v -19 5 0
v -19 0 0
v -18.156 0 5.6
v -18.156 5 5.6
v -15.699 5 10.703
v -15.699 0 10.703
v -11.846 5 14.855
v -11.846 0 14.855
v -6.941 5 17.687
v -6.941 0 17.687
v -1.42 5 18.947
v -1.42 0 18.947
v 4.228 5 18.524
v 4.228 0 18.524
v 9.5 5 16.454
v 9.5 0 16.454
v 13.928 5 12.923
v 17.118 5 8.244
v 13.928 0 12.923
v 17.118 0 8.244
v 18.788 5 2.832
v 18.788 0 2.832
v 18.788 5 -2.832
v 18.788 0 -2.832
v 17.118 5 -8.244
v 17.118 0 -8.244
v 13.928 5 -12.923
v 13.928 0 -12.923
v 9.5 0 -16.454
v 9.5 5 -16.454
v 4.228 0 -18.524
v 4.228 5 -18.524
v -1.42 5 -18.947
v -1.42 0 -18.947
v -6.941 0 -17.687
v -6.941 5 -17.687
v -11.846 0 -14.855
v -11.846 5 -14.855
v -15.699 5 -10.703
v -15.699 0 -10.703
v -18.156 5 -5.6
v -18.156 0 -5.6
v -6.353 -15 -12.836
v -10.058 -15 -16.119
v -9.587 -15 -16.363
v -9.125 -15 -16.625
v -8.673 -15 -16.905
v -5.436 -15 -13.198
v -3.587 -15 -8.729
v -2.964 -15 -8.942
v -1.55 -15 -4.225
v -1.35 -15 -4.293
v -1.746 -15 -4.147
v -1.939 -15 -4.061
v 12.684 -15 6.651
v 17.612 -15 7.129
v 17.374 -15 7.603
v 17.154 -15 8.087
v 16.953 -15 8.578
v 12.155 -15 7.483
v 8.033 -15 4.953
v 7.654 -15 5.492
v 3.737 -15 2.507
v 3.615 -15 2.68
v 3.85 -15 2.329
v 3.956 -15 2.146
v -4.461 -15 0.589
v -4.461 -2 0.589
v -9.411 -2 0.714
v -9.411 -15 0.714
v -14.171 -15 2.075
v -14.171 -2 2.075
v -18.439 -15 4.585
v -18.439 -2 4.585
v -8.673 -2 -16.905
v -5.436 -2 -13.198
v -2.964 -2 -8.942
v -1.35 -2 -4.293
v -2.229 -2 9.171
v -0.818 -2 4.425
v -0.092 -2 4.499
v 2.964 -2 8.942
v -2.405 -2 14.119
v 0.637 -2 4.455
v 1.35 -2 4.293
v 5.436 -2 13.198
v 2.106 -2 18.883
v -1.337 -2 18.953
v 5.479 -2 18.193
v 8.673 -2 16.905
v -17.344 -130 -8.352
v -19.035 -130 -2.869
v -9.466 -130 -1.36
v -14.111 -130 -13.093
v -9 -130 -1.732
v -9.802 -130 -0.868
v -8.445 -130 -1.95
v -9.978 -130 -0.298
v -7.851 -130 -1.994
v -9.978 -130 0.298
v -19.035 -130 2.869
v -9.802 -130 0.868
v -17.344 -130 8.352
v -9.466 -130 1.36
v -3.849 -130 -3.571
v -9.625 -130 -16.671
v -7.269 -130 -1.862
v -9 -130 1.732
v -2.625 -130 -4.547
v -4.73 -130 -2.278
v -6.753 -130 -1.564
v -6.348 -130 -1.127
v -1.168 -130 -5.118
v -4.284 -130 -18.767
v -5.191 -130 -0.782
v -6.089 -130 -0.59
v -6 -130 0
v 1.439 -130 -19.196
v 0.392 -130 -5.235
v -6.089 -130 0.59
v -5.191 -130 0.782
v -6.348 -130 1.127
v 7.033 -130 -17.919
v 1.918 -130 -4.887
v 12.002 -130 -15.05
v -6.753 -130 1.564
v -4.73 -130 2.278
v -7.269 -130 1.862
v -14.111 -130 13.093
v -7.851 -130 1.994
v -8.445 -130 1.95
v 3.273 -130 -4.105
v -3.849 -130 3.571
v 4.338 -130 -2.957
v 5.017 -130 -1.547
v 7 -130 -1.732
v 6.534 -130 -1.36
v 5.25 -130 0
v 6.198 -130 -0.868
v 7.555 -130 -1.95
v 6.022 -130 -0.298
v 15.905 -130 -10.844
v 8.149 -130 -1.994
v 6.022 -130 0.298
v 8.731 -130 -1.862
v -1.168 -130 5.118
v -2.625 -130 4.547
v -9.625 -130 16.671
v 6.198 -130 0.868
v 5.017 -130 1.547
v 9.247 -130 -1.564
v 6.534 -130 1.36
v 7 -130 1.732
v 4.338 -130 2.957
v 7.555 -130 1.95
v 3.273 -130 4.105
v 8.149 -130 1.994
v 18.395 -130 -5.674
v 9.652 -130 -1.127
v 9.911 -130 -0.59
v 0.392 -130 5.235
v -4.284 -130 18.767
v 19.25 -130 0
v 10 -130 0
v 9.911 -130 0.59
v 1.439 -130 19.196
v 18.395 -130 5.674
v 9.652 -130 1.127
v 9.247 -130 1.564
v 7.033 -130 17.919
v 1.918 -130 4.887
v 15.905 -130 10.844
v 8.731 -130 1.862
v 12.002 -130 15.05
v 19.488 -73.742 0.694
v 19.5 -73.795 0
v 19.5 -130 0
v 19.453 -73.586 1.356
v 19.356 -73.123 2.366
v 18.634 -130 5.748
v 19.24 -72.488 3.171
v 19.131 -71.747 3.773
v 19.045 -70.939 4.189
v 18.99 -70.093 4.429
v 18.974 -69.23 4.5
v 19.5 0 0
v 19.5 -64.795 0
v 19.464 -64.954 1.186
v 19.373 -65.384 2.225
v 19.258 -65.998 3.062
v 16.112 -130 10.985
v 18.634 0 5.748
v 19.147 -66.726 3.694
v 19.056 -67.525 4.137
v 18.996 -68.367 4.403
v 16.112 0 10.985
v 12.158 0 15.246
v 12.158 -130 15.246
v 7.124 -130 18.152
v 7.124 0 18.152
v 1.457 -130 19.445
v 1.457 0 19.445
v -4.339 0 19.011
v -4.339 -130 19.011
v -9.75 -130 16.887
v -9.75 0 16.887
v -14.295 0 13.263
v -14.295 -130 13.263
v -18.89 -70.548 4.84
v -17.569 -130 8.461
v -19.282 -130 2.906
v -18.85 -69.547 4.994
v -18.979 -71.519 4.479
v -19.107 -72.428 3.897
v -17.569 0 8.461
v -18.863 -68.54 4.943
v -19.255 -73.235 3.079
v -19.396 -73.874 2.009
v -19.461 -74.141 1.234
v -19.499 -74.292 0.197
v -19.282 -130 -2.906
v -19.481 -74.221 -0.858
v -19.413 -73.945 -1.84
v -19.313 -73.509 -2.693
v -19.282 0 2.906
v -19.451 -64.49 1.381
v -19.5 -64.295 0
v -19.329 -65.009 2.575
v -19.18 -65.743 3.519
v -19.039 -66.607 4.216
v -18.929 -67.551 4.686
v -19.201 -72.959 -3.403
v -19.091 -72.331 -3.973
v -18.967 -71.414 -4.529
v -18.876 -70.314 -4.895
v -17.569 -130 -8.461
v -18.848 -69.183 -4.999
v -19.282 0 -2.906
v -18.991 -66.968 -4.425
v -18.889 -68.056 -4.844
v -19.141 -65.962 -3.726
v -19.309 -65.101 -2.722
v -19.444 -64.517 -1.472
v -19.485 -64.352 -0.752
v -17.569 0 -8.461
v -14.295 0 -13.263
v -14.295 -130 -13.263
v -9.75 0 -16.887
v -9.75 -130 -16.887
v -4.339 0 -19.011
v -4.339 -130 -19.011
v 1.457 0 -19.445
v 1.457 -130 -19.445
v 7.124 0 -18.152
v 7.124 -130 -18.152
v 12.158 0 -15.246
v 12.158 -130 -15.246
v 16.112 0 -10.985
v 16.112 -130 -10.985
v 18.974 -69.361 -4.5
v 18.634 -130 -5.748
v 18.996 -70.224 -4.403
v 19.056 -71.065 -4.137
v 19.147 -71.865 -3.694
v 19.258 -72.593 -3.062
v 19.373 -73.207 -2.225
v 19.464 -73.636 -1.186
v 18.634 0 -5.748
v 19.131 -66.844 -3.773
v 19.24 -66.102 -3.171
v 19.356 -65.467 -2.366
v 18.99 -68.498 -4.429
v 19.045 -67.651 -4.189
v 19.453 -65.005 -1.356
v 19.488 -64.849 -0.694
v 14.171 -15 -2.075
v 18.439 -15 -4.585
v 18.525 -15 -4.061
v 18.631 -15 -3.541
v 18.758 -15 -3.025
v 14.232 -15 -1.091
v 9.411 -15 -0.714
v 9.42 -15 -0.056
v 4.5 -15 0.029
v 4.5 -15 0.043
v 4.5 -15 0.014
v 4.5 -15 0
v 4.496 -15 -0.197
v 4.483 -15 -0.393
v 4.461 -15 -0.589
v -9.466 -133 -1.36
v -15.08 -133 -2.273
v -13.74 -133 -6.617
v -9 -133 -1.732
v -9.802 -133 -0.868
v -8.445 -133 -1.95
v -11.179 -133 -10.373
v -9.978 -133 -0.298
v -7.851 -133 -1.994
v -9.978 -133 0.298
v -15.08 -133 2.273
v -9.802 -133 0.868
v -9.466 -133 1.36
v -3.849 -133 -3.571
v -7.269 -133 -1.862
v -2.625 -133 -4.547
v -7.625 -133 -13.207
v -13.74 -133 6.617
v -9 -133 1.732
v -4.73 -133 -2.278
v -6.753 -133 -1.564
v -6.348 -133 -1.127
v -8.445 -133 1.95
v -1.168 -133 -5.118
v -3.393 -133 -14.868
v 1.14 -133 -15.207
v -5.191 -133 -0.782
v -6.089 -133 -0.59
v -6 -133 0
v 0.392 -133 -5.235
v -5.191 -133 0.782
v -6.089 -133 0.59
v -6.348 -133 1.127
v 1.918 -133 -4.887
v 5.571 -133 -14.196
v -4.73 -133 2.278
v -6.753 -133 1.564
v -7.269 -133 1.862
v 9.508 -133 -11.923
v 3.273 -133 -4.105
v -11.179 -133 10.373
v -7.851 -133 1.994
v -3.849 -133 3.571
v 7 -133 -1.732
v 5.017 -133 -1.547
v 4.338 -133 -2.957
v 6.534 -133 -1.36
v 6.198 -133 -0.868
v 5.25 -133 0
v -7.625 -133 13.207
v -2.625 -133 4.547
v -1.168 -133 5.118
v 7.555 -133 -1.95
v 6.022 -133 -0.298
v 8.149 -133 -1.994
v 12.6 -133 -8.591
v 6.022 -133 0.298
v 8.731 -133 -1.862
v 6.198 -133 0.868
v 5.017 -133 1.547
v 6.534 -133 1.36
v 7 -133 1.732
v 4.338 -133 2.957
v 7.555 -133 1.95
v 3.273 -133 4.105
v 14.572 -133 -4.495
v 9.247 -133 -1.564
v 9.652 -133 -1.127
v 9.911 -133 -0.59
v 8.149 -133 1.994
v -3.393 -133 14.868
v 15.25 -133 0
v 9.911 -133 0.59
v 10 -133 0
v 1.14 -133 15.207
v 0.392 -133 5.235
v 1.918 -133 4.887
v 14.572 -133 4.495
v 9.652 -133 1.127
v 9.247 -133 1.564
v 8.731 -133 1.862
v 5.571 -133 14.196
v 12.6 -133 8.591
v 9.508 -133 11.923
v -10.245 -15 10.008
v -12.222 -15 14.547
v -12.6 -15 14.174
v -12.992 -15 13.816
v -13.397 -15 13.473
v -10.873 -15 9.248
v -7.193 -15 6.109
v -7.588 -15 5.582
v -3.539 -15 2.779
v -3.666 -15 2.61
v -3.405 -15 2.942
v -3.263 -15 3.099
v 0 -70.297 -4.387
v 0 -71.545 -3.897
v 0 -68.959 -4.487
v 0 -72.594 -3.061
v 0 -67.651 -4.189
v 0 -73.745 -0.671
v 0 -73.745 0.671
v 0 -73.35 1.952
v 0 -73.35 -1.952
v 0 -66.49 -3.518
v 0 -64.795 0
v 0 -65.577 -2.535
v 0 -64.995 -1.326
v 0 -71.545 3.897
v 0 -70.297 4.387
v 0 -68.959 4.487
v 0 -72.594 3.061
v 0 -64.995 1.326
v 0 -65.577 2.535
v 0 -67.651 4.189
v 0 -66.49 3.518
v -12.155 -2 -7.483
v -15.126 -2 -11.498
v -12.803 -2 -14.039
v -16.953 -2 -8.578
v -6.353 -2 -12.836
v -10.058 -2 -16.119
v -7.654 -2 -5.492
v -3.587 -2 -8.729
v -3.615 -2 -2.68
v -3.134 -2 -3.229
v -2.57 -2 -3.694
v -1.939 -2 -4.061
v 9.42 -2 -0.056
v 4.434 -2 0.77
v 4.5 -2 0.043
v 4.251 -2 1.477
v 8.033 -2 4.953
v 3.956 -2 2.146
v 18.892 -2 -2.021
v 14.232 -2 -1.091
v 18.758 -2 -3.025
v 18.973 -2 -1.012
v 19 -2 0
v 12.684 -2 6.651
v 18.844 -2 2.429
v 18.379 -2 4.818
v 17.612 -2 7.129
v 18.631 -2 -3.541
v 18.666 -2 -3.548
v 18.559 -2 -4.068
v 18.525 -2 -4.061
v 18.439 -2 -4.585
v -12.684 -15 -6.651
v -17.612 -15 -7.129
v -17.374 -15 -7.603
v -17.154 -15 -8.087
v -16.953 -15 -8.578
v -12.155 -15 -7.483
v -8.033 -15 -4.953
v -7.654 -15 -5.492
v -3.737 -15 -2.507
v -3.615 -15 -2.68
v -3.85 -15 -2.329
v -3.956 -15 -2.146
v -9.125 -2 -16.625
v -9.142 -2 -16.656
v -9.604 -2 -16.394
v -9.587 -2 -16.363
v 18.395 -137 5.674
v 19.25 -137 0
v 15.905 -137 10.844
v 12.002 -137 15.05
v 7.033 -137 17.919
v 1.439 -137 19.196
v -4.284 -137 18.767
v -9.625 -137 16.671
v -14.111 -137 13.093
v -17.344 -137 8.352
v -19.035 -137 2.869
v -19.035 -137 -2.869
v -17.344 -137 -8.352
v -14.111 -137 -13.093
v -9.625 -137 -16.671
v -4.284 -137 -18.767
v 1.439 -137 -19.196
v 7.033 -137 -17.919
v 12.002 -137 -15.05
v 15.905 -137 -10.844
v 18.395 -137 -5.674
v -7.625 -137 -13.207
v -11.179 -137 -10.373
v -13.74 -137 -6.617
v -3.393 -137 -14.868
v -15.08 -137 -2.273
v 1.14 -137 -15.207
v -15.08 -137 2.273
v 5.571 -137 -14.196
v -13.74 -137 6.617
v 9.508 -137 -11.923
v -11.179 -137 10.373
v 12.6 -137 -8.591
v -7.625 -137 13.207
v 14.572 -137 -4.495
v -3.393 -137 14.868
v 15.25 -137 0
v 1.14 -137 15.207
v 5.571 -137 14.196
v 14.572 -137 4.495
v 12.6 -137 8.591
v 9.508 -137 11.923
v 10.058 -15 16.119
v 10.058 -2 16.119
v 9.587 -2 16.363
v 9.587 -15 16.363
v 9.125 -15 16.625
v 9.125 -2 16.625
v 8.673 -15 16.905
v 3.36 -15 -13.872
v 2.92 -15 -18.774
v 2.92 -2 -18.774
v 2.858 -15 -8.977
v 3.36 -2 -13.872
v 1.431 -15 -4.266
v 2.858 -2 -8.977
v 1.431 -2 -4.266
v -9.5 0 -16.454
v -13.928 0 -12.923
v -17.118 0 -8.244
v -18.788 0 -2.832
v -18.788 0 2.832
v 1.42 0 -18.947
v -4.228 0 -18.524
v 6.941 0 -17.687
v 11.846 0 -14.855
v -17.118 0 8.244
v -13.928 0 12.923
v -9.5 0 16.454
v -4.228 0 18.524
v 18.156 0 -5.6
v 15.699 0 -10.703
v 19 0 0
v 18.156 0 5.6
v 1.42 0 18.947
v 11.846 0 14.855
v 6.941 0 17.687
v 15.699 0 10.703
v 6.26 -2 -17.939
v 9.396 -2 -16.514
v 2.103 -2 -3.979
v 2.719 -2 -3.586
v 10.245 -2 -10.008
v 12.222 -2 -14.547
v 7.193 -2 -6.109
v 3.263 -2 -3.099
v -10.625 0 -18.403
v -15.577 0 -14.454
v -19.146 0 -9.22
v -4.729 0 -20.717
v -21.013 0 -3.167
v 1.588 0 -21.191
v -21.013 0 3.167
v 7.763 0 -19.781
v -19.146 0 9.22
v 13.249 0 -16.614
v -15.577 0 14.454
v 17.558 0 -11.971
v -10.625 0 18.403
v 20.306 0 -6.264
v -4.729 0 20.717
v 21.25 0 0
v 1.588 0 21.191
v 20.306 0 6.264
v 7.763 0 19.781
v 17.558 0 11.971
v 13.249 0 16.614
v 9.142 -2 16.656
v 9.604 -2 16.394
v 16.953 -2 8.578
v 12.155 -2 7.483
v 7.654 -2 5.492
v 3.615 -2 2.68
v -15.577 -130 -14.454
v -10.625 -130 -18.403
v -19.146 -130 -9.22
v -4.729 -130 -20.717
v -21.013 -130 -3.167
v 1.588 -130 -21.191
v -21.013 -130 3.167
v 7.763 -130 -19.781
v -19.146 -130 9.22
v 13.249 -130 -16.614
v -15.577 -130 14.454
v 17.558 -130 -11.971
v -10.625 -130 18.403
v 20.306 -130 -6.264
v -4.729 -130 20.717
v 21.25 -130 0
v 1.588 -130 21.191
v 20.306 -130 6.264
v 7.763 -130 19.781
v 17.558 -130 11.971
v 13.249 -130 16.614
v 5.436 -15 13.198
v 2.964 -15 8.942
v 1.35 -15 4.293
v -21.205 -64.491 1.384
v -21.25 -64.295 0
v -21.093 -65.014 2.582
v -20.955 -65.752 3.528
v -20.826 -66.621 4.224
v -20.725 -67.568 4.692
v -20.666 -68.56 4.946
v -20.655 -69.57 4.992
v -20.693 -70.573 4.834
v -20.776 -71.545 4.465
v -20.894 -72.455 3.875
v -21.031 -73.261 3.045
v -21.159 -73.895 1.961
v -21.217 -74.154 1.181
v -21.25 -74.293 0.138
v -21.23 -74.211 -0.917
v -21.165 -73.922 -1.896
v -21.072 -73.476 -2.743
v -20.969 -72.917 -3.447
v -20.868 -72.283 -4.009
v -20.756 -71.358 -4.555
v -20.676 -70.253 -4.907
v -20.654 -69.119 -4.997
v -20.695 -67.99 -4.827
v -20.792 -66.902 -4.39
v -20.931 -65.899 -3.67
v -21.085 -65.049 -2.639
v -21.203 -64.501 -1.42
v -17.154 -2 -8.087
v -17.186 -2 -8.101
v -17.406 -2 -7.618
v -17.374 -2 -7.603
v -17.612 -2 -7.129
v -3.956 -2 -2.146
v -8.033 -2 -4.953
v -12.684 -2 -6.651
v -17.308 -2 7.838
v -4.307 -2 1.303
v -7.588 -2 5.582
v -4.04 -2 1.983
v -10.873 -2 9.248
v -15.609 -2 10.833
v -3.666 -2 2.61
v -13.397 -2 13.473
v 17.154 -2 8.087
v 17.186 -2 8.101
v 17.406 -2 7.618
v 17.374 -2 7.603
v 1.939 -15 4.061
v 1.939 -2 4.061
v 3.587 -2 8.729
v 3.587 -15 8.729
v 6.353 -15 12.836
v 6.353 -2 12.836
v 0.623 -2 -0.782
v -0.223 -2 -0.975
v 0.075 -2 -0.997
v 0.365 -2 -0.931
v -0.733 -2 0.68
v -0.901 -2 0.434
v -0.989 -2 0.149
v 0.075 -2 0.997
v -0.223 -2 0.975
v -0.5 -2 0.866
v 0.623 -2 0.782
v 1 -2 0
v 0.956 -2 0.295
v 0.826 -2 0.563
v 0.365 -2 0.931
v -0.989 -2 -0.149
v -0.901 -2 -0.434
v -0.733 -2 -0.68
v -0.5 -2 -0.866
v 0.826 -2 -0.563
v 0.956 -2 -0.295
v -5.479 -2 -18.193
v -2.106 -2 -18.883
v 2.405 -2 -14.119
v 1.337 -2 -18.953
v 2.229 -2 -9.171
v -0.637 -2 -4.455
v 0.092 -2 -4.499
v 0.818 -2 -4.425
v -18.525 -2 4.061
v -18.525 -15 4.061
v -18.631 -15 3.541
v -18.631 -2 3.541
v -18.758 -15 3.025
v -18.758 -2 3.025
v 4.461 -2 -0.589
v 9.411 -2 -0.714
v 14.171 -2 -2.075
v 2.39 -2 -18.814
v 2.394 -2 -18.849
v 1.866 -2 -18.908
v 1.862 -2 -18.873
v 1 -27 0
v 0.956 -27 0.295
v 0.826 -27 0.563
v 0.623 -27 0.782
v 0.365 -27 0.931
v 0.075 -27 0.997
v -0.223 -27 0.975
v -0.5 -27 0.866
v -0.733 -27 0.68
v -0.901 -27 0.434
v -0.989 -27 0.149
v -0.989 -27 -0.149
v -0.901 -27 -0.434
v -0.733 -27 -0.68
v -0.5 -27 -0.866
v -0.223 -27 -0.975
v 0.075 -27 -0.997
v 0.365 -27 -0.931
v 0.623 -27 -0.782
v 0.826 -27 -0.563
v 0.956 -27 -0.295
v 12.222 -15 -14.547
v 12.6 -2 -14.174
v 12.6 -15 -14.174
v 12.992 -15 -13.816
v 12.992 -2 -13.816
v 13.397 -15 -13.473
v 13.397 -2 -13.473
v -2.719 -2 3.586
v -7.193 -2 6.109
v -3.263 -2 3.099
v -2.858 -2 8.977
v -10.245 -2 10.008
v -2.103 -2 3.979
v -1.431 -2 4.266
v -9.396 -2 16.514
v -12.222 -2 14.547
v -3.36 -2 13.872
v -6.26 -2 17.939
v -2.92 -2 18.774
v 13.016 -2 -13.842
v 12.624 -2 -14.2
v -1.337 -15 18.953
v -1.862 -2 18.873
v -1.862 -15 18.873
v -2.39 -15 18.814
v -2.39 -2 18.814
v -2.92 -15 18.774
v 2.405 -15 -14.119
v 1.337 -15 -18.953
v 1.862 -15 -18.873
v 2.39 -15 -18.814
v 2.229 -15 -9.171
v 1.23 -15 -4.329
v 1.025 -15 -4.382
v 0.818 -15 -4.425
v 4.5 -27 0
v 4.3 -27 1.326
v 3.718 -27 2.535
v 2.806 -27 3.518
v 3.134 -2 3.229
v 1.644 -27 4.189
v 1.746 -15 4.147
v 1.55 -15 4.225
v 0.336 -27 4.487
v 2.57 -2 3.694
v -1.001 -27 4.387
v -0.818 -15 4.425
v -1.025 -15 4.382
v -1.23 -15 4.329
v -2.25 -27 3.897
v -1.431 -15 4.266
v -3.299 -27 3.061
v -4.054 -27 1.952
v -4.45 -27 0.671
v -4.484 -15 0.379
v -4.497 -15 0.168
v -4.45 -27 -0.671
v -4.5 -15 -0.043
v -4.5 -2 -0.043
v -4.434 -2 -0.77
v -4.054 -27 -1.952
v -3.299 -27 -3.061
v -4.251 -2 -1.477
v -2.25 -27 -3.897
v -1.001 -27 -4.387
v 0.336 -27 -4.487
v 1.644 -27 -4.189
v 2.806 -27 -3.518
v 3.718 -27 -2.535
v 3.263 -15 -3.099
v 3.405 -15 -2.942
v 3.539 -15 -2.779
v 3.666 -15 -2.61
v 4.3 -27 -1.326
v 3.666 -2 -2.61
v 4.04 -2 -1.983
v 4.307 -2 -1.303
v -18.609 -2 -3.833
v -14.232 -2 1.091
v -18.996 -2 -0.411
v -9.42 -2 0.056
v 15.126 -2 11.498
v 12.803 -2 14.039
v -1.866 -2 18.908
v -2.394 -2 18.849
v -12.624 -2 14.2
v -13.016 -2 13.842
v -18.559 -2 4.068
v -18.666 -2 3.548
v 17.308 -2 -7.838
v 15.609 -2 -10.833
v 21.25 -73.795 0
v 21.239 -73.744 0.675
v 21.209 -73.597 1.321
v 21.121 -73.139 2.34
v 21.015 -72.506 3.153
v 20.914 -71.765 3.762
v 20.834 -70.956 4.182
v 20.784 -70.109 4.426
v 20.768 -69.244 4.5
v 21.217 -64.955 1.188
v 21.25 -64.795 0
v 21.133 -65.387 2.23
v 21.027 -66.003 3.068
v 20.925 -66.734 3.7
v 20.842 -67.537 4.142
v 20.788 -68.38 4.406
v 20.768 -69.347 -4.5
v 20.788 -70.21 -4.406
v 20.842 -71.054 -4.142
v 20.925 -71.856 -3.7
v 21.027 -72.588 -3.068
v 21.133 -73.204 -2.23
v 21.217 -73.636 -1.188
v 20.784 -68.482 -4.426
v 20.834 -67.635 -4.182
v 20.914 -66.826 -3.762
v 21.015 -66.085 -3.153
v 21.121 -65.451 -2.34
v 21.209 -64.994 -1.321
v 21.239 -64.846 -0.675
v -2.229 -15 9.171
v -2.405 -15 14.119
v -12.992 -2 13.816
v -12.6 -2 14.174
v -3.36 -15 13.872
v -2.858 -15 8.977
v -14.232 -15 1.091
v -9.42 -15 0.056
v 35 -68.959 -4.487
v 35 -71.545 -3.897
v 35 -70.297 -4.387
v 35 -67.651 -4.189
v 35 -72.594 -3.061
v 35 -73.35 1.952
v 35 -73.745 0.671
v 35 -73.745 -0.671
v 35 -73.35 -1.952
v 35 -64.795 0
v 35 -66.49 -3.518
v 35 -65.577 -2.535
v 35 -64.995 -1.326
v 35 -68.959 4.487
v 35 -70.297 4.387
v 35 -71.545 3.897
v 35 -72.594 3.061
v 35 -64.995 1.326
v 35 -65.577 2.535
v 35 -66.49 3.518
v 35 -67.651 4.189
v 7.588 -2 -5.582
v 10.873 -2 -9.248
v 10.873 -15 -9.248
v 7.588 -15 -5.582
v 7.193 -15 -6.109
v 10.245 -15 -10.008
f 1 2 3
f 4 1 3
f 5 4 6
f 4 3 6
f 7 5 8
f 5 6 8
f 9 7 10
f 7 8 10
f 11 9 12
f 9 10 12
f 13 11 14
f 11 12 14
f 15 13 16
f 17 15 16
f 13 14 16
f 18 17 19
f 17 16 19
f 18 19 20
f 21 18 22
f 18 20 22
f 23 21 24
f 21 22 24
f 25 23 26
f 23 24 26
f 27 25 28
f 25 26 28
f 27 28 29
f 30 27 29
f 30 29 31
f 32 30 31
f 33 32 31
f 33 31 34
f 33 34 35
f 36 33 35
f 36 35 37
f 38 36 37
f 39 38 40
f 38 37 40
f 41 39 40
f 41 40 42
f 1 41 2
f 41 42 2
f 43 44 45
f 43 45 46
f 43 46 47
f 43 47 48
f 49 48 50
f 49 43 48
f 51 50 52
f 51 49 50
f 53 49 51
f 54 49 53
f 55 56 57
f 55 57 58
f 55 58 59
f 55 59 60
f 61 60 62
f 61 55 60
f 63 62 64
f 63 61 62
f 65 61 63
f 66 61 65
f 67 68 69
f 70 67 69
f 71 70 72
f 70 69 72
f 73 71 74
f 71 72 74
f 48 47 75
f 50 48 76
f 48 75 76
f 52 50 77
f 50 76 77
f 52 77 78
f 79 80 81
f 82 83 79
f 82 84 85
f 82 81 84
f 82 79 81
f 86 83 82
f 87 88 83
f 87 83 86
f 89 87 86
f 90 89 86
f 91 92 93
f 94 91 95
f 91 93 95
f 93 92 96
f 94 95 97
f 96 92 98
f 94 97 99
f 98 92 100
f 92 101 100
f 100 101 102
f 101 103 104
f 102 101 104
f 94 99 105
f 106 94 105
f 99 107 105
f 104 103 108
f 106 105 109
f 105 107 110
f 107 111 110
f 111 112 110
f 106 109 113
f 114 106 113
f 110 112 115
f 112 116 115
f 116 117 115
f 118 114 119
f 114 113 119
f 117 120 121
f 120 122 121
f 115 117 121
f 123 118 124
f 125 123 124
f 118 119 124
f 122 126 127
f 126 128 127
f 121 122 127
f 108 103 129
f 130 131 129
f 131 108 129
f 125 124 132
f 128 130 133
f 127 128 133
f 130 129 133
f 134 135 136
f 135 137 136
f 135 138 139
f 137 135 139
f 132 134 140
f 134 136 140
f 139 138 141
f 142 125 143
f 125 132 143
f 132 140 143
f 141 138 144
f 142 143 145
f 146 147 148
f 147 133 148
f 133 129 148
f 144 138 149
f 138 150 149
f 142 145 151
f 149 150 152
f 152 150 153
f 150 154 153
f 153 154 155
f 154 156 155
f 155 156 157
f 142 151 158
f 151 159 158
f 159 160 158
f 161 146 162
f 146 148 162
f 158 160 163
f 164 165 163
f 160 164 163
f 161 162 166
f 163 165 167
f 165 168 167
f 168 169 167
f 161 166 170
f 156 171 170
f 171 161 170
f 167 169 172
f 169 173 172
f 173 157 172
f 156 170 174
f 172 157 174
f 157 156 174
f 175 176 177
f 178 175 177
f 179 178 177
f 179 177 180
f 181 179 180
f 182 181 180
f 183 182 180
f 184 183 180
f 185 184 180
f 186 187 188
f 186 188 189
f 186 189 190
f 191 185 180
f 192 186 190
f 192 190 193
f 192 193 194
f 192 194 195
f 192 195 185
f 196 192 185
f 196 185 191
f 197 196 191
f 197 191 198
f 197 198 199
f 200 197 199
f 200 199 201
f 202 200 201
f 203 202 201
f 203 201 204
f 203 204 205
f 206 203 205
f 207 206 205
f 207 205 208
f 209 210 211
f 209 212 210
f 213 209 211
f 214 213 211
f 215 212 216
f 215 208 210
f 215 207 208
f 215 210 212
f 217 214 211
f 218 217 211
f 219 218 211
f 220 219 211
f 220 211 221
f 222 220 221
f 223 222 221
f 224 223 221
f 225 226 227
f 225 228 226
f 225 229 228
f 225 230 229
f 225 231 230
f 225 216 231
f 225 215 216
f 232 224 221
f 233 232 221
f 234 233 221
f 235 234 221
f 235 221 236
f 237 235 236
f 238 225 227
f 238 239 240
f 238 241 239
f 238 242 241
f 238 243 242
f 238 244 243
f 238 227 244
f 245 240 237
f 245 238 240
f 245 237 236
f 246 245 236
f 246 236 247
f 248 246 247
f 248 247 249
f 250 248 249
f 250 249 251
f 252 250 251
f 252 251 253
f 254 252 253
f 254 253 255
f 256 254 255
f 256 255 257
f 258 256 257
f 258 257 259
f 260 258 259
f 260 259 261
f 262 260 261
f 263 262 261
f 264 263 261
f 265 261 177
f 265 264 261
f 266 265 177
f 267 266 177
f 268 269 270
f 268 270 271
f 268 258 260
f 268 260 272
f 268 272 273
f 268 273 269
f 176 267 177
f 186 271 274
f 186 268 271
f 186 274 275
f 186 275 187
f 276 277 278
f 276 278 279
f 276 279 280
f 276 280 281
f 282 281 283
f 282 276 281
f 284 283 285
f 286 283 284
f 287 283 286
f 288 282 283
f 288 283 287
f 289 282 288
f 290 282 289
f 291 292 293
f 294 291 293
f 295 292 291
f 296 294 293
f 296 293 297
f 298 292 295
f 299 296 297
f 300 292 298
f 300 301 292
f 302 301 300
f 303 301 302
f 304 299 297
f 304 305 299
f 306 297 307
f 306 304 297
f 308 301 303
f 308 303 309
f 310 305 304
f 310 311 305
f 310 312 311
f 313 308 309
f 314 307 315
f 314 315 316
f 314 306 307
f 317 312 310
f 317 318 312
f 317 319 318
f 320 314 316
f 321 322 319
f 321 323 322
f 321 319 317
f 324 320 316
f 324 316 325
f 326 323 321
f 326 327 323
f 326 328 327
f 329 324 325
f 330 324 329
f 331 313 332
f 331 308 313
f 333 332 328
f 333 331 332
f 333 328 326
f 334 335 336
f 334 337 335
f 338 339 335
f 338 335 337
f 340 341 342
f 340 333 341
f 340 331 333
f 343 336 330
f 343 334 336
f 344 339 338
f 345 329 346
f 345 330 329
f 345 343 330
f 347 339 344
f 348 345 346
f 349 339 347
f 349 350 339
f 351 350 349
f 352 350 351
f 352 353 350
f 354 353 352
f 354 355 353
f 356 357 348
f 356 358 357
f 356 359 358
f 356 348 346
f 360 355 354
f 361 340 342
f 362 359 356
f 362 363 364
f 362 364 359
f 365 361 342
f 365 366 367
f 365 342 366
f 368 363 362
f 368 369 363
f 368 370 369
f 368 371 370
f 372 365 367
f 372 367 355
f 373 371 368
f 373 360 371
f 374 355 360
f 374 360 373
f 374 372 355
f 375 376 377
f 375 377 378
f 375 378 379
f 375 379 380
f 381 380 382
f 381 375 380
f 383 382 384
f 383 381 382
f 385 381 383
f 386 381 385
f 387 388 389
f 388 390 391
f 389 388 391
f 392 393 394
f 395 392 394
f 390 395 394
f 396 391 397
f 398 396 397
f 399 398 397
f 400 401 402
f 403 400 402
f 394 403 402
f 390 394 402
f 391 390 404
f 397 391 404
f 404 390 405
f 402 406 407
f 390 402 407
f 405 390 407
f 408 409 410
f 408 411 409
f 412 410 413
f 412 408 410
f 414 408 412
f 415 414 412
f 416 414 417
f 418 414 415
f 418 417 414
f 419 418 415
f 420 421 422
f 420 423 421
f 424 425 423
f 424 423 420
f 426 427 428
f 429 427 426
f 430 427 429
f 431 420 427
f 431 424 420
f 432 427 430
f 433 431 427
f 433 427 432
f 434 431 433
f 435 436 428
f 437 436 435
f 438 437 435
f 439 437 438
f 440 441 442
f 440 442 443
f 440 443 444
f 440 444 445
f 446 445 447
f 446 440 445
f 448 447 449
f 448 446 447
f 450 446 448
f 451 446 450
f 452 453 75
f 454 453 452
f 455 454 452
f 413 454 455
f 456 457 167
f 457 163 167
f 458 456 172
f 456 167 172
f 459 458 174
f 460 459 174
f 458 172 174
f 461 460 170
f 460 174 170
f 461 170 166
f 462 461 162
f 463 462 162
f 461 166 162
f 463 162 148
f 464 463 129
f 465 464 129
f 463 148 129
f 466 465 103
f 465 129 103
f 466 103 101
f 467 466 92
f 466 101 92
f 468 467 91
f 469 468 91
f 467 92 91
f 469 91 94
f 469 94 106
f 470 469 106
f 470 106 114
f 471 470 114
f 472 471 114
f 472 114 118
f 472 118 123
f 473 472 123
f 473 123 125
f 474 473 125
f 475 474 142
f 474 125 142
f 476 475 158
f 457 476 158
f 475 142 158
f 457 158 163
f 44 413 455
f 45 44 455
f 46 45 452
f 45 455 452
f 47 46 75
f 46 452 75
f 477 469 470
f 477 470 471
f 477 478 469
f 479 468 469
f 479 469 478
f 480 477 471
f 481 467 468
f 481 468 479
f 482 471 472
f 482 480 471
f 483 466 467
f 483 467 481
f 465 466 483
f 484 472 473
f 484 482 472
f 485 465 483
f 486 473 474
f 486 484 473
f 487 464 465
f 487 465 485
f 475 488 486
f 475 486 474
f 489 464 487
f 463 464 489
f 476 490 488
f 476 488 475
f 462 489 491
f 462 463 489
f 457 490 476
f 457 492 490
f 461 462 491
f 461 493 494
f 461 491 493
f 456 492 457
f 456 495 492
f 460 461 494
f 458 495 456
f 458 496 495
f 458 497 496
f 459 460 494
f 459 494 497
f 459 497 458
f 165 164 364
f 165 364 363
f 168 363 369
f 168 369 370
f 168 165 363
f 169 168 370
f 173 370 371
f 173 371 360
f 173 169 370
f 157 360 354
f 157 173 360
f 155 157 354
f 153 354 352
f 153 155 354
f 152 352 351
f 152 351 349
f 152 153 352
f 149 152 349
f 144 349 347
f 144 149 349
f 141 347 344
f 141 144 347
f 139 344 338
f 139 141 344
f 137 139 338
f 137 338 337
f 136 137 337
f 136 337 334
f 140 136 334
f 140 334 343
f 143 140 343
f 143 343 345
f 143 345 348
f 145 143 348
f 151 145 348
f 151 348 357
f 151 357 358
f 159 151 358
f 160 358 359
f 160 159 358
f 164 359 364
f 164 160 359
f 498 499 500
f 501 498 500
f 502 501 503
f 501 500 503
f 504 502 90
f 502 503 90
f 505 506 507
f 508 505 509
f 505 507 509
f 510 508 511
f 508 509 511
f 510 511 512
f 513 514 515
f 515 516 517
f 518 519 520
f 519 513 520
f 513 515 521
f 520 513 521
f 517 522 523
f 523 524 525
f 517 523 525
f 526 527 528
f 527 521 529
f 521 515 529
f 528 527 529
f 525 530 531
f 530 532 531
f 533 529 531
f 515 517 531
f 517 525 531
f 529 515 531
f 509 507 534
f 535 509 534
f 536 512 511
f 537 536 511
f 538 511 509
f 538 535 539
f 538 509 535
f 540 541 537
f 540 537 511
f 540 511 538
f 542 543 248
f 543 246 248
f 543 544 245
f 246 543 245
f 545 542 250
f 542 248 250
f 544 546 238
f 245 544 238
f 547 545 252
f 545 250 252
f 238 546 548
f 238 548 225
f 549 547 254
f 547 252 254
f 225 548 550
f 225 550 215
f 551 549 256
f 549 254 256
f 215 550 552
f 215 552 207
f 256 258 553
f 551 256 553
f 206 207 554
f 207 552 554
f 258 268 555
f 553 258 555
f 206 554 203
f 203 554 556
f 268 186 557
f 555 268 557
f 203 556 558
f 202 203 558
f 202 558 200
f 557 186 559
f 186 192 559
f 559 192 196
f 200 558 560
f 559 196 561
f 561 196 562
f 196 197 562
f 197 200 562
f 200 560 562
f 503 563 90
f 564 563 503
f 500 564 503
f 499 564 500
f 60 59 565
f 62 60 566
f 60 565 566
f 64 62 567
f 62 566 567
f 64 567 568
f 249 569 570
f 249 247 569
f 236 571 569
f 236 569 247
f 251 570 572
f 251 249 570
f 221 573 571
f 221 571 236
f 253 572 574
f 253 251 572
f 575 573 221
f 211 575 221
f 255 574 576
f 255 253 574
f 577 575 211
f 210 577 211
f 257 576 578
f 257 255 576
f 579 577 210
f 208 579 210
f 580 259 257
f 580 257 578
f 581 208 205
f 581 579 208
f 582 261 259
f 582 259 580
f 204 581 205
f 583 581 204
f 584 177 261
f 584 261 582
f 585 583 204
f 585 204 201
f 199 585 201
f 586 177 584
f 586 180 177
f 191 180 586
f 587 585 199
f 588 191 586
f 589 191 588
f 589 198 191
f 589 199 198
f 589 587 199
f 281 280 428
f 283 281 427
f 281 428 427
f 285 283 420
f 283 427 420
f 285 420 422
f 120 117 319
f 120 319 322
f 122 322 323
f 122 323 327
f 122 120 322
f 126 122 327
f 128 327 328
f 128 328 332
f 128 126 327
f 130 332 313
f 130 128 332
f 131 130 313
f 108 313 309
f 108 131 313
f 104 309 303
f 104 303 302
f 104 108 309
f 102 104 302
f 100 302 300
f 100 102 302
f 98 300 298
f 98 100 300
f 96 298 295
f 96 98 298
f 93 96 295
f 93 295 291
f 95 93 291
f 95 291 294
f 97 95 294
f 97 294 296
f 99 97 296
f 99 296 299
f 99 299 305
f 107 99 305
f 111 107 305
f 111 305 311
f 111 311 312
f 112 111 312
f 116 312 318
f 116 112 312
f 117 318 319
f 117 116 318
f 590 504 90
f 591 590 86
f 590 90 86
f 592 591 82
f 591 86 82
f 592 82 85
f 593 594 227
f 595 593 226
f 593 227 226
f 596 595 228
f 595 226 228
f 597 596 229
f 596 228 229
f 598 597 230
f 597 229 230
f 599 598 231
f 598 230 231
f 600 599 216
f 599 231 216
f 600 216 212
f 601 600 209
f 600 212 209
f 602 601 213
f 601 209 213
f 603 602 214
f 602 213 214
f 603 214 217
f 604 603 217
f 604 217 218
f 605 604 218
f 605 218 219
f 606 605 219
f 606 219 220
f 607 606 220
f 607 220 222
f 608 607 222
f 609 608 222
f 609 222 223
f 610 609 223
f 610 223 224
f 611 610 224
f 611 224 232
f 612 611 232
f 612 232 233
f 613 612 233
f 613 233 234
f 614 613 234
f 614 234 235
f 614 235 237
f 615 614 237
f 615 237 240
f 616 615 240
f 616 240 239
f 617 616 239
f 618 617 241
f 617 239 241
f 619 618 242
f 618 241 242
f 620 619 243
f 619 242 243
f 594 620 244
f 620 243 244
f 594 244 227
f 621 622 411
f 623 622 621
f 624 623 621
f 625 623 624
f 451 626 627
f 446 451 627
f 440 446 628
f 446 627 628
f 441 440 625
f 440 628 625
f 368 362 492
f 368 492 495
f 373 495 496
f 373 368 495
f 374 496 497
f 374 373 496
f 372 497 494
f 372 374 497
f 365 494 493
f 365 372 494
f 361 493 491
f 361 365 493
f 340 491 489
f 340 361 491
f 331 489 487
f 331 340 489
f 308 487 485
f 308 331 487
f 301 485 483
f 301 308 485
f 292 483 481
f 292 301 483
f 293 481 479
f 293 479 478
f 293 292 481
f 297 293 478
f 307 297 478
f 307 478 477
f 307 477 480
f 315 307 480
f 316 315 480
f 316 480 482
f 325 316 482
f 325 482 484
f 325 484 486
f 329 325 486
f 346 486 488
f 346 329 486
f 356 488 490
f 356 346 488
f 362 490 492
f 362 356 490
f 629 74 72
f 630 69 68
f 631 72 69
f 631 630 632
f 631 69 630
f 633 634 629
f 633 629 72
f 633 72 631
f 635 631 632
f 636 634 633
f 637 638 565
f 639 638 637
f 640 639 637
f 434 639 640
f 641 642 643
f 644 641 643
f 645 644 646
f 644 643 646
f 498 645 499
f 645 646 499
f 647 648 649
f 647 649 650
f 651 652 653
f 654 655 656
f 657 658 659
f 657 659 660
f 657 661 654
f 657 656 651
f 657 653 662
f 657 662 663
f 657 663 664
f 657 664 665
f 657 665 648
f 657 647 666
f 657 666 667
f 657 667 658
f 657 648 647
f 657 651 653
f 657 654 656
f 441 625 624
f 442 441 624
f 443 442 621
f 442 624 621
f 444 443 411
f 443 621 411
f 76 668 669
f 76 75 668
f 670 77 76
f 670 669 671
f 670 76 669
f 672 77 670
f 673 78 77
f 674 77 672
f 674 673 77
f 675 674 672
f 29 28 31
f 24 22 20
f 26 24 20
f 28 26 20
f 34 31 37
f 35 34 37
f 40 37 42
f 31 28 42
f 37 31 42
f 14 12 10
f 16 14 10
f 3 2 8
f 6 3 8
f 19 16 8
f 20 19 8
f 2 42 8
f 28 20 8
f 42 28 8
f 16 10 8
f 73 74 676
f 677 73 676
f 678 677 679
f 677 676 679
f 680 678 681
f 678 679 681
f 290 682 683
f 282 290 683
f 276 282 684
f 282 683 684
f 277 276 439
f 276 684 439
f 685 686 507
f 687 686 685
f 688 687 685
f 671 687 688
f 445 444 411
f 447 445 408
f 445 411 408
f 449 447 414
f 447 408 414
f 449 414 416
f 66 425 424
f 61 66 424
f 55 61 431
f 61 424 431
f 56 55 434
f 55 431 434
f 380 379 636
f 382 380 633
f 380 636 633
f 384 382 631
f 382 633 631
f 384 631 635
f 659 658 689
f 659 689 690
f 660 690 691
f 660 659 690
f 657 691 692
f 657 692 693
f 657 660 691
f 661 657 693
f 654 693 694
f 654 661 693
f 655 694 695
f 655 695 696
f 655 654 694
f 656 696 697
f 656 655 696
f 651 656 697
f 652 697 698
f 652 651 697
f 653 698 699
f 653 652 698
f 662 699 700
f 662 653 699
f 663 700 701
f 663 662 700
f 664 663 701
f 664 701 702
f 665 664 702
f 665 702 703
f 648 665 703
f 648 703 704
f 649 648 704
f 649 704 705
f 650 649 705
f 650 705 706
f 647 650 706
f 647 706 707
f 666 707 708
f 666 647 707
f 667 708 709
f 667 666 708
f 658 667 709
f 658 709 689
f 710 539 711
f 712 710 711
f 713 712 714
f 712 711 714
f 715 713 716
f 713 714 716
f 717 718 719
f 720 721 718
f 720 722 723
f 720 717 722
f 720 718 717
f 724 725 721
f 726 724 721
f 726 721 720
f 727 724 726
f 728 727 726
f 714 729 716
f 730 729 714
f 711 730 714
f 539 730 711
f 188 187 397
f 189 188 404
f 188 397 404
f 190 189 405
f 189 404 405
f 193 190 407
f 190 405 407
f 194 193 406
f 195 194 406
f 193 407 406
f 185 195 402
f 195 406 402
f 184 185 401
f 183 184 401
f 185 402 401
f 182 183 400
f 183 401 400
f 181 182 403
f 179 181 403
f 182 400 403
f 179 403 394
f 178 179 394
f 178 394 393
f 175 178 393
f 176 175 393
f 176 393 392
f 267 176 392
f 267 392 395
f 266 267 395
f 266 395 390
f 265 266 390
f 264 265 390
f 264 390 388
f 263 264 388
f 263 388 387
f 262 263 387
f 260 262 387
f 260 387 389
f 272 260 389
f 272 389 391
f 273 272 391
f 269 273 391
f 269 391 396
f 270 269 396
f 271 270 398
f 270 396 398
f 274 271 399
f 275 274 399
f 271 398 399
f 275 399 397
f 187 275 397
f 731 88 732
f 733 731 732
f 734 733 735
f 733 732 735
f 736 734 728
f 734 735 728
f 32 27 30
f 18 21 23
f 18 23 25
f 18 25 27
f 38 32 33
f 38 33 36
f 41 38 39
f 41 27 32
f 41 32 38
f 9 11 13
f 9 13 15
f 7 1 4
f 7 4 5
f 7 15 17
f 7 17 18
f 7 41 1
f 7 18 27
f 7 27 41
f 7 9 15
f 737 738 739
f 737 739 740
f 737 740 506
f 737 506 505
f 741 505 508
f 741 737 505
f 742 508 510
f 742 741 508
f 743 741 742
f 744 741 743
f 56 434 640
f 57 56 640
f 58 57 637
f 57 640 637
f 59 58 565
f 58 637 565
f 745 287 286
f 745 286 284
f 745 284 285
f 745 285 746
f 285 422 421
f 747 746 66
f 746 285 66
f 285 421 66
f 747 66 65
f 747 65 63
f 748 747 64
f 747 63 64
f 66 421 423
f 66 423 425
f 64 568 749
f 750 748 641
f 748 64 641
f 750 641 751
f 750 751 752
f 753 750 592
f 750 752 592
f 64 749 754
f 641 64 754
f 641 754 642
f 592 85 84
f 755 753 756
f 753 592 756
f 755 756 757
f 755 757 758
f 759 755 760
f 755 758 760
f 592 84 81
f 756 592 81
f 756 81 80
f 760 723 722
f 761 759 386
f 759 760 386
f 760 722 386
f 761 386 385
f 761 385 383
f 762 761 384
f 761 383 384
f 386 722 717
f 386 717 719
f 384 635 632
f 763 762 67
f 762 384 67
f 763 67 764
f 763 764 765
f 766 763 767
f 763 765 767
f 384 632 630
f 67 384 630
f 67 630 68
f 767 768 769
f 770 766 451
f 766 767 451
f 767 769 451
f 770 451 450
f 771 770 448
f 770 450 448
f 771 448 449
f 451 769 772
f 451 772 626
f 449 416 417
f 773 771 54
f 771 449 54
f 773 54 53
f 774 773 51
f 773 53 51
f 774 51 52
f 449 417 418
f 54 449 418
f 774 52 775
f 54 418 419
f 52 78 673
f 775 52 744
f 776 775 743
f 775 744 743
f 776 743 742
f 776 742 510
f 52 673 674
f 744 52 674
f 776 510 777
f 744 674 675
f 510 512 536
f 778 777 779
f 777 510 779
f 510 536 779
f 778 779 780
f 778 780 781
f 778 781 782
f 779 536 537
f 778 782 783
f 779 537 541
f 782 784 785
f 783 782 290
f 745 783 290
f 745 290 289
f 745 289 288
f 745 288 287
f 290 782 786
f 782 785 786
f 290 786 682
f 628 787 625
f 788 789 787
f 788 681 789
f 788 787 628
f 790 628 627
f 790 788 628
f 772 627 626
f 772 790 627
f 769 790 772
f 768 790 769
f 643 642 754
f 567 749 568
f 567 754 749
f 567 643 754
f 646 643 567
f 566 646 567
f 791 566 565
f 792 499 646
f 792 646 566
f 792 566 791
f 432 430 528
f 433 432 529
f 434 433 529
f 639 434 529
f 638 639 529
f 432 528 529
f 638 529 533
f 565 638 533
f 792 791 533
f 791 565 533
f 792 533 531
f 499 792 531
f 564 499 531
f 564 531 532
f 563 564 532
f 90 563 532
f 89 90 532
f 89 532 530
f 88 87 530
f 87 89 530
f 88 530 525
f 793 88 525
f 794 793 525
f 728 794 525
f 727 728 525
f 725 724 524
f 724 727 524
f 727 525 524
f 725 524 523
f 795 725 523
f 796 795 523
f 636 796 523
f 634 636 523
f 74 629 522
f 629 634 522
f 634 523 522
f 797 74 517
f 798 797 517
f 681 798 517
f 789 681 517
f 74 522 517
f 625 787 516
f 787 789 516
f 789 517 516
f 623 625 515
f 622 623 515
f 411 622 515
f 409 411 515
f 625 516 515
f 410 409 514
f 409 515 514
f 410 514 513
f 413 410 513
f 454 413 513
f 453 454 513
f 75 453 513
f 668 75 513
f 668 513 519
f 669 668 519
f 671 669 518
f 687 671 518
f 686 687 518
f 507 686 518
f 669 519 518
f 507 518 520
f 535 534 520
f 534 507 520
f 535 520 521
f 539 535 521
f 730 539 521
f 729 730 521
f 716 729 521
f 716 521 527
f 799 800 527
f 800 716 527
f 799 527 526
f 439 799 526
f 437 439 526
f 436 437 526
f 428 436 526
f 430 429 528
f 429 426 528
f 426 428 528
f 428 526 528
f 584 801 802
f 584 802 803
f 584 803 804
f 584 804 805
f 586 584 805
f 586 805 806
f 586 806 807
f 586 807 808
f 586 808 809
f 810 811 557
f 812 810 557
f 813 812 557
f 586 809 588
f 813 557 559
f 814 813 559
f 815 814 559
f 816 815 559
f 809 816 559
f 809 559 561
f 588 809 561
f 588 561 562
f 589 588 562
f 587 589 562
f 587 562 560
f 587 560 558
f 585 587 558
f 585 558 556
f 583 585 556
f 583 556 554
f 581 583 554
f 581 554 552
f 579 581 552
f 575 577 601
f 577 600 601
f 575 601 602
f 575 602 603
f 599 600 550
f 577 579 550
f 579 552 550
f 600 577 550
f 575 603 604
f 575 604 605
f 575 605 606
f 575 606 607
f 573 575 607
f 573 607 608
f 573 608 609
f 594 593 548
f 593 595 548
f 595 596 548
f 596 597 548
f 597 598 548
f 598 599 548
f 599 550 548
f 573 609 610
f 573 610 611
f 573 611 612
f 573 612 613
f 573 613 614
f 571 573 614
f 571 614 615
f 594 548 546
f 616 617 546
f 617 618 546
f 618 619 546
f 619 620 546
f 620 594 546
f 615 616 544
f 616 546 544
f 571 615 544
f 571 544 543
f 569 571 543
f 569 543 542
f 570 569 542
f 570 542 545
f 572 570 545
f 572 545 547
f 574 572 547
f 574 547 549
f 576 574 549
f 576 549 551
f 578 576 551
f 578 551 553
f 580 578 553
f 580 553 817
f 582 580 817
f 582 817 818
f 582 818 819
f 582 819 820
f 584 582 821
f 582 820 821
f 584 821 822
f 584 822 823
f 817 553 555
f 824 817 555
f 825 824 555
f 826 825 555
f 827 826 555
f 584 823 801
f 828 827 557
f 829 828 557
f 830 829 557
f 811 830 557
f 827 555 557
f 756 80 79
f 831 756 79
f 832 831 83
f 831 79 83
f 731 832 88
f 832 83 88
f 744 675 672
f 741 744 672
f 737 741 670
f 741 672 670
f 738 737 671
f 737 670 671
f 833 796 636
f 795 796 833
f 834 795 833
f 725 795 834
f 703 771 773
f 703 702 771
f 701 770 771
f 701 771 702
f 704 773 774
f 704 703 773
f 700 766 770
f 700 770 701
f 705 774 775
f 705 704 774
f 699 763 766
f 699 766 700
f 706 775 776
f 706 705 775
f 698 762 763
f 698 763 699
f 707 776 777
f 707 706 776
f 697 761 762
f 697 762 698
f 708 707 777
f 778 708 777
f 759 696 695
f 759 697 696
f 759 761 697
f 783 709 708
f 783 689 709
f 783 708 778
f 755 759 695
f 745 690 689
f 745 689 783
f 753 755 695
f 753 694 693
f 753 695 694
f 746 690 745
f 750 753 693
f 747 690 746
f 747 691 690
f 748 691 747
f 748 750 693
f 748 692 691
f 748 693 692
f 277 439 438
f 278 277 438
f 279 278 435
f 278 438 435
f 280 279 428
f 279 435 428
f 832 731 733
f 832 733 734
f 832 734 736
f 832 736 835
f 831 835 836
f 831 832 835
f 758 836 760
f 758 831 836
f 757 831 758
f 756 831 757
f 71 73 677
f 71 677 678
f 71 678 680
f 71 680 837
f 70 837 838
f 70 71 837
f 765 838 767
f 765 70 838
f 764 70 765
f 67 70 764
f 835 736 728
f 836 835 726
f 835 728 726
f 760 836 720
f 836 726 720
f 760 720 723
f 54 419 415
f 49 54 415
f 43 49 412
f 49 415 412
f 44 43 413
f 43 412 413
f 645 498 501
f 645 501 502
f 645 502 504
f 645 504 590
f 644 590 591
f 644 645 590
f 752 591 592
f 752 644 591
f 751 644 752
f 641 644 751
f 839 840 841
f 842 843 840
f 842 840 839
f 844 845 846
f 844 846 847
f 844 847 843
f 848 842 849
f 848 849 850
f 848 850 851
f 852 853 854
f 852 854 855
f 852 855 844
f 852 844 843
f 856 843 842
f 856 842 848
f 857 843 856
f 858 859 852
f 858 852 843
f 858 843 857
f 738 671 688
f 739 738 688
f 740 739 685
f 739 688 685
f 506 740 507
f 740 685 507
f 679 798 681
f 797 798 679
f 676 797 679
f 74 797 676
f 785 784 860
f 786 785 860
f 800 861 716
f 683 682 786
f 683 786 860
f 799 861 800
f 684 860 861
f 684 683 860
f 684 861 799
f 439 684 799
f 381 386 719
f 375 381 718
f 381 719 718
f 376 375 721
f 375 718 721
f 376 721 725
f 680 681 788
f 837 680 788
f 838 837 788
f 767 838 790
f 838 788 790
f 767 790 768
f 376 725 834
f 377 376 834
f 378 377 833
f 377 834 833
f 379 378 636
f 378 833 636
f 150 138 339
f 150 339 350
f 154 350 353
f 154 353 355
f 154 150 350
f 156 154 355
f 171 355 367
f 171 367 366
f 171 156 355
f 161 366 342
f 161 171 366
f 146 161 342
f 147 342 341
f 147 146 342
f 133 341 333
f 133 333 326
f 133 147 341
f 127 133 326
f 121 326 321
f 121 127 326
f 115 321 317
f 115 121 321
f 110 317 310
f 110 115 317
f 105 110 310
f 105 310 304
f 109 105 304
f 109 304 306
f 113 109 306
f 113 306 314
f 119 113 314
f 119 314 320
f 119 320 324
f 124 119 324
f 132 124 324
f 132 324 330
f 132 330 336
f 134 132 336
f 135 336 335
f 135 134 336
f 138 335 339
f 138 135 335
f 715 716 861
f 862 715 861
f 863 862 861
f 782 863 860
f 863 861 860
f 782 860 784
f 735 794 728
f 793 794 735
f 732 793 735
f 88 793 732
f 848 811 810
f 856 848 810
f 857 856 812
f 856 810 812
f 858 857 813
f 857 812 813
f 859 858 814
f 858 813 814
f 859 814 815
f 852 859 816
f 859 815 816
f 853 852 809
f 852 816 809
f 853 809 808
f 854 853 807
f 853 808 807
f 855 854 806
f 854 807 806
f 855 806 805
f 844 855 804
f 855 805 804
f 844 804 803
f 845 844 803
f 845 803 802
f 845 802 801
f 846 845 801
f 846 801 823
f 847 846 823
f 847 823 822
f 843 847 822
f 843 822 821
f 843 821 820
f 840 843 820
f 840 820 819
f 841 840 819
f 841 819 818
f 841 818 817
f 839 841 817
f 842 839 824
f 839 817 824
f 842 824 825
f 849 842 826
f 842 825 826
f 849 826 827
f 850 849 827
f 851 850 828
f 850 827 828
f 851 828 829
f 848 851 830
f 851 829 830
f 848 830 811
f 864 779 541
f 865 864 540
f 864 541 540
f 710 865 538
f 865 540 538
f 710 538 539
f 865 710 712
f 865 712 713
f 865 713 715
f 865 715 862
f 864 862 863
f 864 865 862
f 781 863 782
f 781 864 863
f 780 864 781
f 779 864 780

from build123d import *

# Parameters (mm, degrees)
F0_R      = 21.25
F0_R_2    = 19.5
F1_DEPTH  = 130
F2_R      = 19
F3_DEPTH  = 2
F6_DEPTH  = 15
F7_COUNT  = 10
F8_R      = 4.5
F8_R_2    = 1
F9_DEPTH  = 25
F11_R     = 13.5
F11_R_2   = 1
F11_R_3   = 5
F12_DEPTH = 2
F13_R     = 19
F14_DEPTH = 5
F16_R     = 19.25
F16_R_2   = 2
F16_R_3   = 5.25
F17_DEPTH = 3
F18_R     = 19.25
F18_R_2   = 15.25
F19_DEPTH = 4
F20_R     = 5
F21_DEPTH = 25
F23_R     = 4.5
F23_R_2   = 3.5
F22_R     = 4.5
F24_DEPTH = 35


with BuildPart() as f1:
    # F0 (on Front) → F1 (new body)
    with BuildSketch(Plane.XZ):
        Circle(F0_R)
        Circle(F0_R_2, mode=Mode.SUBTRACT)
    extrude(amount=F1_DEPTH)

    # F20 (on Right) → F21 (cut)
    with BuildSketch(Plane.YZ):
        with Locations((-69.295404115, 0)):
            Circle(F20_R)
    extrude(amount=-F21_DEPTH, mode=Mode.SUBTRACT)

    # F23 (on Right) + F22 (on Right) → F24 (join)
    with BuildSketch(Plane.YZ):
        with Locations((-69.295404115, 0)):
            Circle(F23_R)
        with Locations((-69.295404115, 0)):
            Circle(F23_R_2, mode=Mode.SUBTRACT)
    with BuildSketch(Plane.YZ):
        with Locations((-69.295404115, 0)):
            Circle(F22_R)
    extrude(amount=F24_DEPTH)


with BuildPart() as f3:
    # F2 (on Front) → F3 (new body)
    with BuildSketch(Plane.XZ):
        Circle(F2_R)
    extrude(amount=F3_DEPTH)

    # F5 (on Front) → F6 (join)
    with BuildSketch(Plane.XZ):
        with BuildLine():
            ThreePointArc((-4, 0), (-4.0025921682, 0.3264822232), (-3.9471254766, 0.648228719))
            ThreePointArc((-3.9471254766, 0.648228719), (-11.584566807, 1.1744826423), (-18.4385144491, 4.5848865755))
            ThreePointArc((-18.4385144491, 4.5848865755), (-18.5755861543, 3.8002382146), (-18.7576805779, 3.0248007101))
            ThreePointArc((-18.7576805779, 3.0248007101), (-11.6055227609, 0.4064407121), (-4, 0))
        make_face()
        with BuildLine():
            ThreePointArc((-4, 0), (-3.9867594551, 0.3251907853), (-3.9471254766, 0.648228719))
            ThreePointArc((-3.9471254766, 0.648228719), (-4.0025921682, 0.3264822232), (-4, 0))
        make_face()
    extrude(amount=F6_DEPTH)


with BuildPart() as f7_1:
    # F7: instance of F3
    add(f3.part.rotate(Axis((0, 8.3387196064, 0), (0, 1, 0)), 1 * 360 / F7_COUNT))


with BuildPart() as f7_2:
    # F7: instance of F3
    add(f3.part.rotate(Axis((0, 8.3387196064, 0), (0, 1, 0)), 2 * 360 / F7_COUNT))


with BuildPart() as f7_3:
    # F7: instance of F3
    add(f3.part.rotate(Axis((0, 8.3387196064, 0), (0, 1, 0)), 3 * 360 / F7_COUNT))


with BuildPart() as f7_4:
    # F7: instance of F3
    add(f3.part.rotate(Axis((0, 8.3387196064, 0), (0, 1, 0)), 4 * 360 / F7_COUNT))


with BuildPart() as f7_5:
    # F7: instance of F3
    add(f3.part.rotate(Axis((0, 8.3387196064, 0), (0, 1, 0)), 5 * 360 / F7_COUNT))


with BuildPart() as f7_6:
    # F7: instance of F3
    add(f3.part.rotate(Axis((0, 8.3387196064, 0), (0, 1, 0)), 6 * 360 / F7_COUNT))


with BuildPart() as f7_7:
    # F7: instance of F3
    add(f3.part.rotate(Axis((0, 8.3387196064, 0), (0, 1, 0)), 7 * 360 / F7_COUNT))


with BuildPart() as f7_8:
    # F7: instance of F3
    add(f3.part.rotate(Axis((0, 8.3387196064, 0), (0, 1, 0)), 8 * 360 / F7_COUNT))


with BuildPart() as f7_9:
    # F7: instance of F3
    add(f3.part.rotate(Axis((0, 8.3387196064, 0), (0, 1, 0)), 9 * 360 / F7_COUNT))


with BuildPart() as f3_1:
    add(f3.part)

    add(f7_1.part)  # F9 merges F7_1

    add(f7_2.part)  # F9 merges F7_2

    add(f7_3.part)  # F9 merges F7_3

    add(f7_4.part)  # F9 merges F7_4

    add(f7_5.part)  # F9 merges F7_5

    add(f7_6.part)  # F9 merges F7_6

    add(f7_7.part)  # F9 merges F7_7

    add(f7_8.part)  # F9 merges F7_8

    add(f7_9.part)  # F9 merges F7_9
    # F8 (on face) → F9 (join)
    with BuildSketch(Plane.XZ.offset(2)):
        Circle(F8_R)
        Circle(F8_R_2, mode=Mode.SUBTRACT)
    extrude(amount=F9_DEPTH)


with BuildPart() as f12:
    # F11 (on offset) → F12 (new body)
    with BuildSketch(Plane.XZ.offset(32)):
        Circle(F11_R)
        with Locations((-8, 0)):
            Circle(F11_R_2, mode=Mode.SUBTRACT)
        Circle(F11_R_3, mode=Mode.SUBTRACT)
        with Locations((8, 0)):
            Circle(F11_R_2, mode=Mode.SUBTRACT)
    extrude(amount=F12_DEPTH)


with BuildPart() as f14:
    # F13 (on face) → F14 (new body)
    with BuildSketch(Plane(origin=(0, 0, 0), x_dir=(-1, 0, 0), z_dir=(0, 1, 0))):
        Circle(F13_R)
    extrude(amount=F14_DEPTH)


with BuildPart() as f17:
    # F16 (on face) → F17 (new body)
    with BuildSketch(Plane.XZ.offset(130)):
        Circle(F16_R)
        with Locations((-8, 0)):
            Circle(F16_R_2, mode=Mode.SUBTRACT)
        Circle(F16_R_3, mode=Mode.SUBTRACT)
        with Locations((8, 0)):
            Circle(F16_R_2, mode=Mode.SUBTRACT)
    extrude(amount=F17_DEPTH)

    # F18 (on face) → F19 (join)
    with BuildSketch(Plane.XZ.offset(133)):
        Circle(F18_R)
        Circle(F18_R_2, mode=Mode.SUBTRACT)
    extrude(amount=F19_DEPTH)


solid = Compound([f1.part, f3_1.part, f14.part, f17.part])
